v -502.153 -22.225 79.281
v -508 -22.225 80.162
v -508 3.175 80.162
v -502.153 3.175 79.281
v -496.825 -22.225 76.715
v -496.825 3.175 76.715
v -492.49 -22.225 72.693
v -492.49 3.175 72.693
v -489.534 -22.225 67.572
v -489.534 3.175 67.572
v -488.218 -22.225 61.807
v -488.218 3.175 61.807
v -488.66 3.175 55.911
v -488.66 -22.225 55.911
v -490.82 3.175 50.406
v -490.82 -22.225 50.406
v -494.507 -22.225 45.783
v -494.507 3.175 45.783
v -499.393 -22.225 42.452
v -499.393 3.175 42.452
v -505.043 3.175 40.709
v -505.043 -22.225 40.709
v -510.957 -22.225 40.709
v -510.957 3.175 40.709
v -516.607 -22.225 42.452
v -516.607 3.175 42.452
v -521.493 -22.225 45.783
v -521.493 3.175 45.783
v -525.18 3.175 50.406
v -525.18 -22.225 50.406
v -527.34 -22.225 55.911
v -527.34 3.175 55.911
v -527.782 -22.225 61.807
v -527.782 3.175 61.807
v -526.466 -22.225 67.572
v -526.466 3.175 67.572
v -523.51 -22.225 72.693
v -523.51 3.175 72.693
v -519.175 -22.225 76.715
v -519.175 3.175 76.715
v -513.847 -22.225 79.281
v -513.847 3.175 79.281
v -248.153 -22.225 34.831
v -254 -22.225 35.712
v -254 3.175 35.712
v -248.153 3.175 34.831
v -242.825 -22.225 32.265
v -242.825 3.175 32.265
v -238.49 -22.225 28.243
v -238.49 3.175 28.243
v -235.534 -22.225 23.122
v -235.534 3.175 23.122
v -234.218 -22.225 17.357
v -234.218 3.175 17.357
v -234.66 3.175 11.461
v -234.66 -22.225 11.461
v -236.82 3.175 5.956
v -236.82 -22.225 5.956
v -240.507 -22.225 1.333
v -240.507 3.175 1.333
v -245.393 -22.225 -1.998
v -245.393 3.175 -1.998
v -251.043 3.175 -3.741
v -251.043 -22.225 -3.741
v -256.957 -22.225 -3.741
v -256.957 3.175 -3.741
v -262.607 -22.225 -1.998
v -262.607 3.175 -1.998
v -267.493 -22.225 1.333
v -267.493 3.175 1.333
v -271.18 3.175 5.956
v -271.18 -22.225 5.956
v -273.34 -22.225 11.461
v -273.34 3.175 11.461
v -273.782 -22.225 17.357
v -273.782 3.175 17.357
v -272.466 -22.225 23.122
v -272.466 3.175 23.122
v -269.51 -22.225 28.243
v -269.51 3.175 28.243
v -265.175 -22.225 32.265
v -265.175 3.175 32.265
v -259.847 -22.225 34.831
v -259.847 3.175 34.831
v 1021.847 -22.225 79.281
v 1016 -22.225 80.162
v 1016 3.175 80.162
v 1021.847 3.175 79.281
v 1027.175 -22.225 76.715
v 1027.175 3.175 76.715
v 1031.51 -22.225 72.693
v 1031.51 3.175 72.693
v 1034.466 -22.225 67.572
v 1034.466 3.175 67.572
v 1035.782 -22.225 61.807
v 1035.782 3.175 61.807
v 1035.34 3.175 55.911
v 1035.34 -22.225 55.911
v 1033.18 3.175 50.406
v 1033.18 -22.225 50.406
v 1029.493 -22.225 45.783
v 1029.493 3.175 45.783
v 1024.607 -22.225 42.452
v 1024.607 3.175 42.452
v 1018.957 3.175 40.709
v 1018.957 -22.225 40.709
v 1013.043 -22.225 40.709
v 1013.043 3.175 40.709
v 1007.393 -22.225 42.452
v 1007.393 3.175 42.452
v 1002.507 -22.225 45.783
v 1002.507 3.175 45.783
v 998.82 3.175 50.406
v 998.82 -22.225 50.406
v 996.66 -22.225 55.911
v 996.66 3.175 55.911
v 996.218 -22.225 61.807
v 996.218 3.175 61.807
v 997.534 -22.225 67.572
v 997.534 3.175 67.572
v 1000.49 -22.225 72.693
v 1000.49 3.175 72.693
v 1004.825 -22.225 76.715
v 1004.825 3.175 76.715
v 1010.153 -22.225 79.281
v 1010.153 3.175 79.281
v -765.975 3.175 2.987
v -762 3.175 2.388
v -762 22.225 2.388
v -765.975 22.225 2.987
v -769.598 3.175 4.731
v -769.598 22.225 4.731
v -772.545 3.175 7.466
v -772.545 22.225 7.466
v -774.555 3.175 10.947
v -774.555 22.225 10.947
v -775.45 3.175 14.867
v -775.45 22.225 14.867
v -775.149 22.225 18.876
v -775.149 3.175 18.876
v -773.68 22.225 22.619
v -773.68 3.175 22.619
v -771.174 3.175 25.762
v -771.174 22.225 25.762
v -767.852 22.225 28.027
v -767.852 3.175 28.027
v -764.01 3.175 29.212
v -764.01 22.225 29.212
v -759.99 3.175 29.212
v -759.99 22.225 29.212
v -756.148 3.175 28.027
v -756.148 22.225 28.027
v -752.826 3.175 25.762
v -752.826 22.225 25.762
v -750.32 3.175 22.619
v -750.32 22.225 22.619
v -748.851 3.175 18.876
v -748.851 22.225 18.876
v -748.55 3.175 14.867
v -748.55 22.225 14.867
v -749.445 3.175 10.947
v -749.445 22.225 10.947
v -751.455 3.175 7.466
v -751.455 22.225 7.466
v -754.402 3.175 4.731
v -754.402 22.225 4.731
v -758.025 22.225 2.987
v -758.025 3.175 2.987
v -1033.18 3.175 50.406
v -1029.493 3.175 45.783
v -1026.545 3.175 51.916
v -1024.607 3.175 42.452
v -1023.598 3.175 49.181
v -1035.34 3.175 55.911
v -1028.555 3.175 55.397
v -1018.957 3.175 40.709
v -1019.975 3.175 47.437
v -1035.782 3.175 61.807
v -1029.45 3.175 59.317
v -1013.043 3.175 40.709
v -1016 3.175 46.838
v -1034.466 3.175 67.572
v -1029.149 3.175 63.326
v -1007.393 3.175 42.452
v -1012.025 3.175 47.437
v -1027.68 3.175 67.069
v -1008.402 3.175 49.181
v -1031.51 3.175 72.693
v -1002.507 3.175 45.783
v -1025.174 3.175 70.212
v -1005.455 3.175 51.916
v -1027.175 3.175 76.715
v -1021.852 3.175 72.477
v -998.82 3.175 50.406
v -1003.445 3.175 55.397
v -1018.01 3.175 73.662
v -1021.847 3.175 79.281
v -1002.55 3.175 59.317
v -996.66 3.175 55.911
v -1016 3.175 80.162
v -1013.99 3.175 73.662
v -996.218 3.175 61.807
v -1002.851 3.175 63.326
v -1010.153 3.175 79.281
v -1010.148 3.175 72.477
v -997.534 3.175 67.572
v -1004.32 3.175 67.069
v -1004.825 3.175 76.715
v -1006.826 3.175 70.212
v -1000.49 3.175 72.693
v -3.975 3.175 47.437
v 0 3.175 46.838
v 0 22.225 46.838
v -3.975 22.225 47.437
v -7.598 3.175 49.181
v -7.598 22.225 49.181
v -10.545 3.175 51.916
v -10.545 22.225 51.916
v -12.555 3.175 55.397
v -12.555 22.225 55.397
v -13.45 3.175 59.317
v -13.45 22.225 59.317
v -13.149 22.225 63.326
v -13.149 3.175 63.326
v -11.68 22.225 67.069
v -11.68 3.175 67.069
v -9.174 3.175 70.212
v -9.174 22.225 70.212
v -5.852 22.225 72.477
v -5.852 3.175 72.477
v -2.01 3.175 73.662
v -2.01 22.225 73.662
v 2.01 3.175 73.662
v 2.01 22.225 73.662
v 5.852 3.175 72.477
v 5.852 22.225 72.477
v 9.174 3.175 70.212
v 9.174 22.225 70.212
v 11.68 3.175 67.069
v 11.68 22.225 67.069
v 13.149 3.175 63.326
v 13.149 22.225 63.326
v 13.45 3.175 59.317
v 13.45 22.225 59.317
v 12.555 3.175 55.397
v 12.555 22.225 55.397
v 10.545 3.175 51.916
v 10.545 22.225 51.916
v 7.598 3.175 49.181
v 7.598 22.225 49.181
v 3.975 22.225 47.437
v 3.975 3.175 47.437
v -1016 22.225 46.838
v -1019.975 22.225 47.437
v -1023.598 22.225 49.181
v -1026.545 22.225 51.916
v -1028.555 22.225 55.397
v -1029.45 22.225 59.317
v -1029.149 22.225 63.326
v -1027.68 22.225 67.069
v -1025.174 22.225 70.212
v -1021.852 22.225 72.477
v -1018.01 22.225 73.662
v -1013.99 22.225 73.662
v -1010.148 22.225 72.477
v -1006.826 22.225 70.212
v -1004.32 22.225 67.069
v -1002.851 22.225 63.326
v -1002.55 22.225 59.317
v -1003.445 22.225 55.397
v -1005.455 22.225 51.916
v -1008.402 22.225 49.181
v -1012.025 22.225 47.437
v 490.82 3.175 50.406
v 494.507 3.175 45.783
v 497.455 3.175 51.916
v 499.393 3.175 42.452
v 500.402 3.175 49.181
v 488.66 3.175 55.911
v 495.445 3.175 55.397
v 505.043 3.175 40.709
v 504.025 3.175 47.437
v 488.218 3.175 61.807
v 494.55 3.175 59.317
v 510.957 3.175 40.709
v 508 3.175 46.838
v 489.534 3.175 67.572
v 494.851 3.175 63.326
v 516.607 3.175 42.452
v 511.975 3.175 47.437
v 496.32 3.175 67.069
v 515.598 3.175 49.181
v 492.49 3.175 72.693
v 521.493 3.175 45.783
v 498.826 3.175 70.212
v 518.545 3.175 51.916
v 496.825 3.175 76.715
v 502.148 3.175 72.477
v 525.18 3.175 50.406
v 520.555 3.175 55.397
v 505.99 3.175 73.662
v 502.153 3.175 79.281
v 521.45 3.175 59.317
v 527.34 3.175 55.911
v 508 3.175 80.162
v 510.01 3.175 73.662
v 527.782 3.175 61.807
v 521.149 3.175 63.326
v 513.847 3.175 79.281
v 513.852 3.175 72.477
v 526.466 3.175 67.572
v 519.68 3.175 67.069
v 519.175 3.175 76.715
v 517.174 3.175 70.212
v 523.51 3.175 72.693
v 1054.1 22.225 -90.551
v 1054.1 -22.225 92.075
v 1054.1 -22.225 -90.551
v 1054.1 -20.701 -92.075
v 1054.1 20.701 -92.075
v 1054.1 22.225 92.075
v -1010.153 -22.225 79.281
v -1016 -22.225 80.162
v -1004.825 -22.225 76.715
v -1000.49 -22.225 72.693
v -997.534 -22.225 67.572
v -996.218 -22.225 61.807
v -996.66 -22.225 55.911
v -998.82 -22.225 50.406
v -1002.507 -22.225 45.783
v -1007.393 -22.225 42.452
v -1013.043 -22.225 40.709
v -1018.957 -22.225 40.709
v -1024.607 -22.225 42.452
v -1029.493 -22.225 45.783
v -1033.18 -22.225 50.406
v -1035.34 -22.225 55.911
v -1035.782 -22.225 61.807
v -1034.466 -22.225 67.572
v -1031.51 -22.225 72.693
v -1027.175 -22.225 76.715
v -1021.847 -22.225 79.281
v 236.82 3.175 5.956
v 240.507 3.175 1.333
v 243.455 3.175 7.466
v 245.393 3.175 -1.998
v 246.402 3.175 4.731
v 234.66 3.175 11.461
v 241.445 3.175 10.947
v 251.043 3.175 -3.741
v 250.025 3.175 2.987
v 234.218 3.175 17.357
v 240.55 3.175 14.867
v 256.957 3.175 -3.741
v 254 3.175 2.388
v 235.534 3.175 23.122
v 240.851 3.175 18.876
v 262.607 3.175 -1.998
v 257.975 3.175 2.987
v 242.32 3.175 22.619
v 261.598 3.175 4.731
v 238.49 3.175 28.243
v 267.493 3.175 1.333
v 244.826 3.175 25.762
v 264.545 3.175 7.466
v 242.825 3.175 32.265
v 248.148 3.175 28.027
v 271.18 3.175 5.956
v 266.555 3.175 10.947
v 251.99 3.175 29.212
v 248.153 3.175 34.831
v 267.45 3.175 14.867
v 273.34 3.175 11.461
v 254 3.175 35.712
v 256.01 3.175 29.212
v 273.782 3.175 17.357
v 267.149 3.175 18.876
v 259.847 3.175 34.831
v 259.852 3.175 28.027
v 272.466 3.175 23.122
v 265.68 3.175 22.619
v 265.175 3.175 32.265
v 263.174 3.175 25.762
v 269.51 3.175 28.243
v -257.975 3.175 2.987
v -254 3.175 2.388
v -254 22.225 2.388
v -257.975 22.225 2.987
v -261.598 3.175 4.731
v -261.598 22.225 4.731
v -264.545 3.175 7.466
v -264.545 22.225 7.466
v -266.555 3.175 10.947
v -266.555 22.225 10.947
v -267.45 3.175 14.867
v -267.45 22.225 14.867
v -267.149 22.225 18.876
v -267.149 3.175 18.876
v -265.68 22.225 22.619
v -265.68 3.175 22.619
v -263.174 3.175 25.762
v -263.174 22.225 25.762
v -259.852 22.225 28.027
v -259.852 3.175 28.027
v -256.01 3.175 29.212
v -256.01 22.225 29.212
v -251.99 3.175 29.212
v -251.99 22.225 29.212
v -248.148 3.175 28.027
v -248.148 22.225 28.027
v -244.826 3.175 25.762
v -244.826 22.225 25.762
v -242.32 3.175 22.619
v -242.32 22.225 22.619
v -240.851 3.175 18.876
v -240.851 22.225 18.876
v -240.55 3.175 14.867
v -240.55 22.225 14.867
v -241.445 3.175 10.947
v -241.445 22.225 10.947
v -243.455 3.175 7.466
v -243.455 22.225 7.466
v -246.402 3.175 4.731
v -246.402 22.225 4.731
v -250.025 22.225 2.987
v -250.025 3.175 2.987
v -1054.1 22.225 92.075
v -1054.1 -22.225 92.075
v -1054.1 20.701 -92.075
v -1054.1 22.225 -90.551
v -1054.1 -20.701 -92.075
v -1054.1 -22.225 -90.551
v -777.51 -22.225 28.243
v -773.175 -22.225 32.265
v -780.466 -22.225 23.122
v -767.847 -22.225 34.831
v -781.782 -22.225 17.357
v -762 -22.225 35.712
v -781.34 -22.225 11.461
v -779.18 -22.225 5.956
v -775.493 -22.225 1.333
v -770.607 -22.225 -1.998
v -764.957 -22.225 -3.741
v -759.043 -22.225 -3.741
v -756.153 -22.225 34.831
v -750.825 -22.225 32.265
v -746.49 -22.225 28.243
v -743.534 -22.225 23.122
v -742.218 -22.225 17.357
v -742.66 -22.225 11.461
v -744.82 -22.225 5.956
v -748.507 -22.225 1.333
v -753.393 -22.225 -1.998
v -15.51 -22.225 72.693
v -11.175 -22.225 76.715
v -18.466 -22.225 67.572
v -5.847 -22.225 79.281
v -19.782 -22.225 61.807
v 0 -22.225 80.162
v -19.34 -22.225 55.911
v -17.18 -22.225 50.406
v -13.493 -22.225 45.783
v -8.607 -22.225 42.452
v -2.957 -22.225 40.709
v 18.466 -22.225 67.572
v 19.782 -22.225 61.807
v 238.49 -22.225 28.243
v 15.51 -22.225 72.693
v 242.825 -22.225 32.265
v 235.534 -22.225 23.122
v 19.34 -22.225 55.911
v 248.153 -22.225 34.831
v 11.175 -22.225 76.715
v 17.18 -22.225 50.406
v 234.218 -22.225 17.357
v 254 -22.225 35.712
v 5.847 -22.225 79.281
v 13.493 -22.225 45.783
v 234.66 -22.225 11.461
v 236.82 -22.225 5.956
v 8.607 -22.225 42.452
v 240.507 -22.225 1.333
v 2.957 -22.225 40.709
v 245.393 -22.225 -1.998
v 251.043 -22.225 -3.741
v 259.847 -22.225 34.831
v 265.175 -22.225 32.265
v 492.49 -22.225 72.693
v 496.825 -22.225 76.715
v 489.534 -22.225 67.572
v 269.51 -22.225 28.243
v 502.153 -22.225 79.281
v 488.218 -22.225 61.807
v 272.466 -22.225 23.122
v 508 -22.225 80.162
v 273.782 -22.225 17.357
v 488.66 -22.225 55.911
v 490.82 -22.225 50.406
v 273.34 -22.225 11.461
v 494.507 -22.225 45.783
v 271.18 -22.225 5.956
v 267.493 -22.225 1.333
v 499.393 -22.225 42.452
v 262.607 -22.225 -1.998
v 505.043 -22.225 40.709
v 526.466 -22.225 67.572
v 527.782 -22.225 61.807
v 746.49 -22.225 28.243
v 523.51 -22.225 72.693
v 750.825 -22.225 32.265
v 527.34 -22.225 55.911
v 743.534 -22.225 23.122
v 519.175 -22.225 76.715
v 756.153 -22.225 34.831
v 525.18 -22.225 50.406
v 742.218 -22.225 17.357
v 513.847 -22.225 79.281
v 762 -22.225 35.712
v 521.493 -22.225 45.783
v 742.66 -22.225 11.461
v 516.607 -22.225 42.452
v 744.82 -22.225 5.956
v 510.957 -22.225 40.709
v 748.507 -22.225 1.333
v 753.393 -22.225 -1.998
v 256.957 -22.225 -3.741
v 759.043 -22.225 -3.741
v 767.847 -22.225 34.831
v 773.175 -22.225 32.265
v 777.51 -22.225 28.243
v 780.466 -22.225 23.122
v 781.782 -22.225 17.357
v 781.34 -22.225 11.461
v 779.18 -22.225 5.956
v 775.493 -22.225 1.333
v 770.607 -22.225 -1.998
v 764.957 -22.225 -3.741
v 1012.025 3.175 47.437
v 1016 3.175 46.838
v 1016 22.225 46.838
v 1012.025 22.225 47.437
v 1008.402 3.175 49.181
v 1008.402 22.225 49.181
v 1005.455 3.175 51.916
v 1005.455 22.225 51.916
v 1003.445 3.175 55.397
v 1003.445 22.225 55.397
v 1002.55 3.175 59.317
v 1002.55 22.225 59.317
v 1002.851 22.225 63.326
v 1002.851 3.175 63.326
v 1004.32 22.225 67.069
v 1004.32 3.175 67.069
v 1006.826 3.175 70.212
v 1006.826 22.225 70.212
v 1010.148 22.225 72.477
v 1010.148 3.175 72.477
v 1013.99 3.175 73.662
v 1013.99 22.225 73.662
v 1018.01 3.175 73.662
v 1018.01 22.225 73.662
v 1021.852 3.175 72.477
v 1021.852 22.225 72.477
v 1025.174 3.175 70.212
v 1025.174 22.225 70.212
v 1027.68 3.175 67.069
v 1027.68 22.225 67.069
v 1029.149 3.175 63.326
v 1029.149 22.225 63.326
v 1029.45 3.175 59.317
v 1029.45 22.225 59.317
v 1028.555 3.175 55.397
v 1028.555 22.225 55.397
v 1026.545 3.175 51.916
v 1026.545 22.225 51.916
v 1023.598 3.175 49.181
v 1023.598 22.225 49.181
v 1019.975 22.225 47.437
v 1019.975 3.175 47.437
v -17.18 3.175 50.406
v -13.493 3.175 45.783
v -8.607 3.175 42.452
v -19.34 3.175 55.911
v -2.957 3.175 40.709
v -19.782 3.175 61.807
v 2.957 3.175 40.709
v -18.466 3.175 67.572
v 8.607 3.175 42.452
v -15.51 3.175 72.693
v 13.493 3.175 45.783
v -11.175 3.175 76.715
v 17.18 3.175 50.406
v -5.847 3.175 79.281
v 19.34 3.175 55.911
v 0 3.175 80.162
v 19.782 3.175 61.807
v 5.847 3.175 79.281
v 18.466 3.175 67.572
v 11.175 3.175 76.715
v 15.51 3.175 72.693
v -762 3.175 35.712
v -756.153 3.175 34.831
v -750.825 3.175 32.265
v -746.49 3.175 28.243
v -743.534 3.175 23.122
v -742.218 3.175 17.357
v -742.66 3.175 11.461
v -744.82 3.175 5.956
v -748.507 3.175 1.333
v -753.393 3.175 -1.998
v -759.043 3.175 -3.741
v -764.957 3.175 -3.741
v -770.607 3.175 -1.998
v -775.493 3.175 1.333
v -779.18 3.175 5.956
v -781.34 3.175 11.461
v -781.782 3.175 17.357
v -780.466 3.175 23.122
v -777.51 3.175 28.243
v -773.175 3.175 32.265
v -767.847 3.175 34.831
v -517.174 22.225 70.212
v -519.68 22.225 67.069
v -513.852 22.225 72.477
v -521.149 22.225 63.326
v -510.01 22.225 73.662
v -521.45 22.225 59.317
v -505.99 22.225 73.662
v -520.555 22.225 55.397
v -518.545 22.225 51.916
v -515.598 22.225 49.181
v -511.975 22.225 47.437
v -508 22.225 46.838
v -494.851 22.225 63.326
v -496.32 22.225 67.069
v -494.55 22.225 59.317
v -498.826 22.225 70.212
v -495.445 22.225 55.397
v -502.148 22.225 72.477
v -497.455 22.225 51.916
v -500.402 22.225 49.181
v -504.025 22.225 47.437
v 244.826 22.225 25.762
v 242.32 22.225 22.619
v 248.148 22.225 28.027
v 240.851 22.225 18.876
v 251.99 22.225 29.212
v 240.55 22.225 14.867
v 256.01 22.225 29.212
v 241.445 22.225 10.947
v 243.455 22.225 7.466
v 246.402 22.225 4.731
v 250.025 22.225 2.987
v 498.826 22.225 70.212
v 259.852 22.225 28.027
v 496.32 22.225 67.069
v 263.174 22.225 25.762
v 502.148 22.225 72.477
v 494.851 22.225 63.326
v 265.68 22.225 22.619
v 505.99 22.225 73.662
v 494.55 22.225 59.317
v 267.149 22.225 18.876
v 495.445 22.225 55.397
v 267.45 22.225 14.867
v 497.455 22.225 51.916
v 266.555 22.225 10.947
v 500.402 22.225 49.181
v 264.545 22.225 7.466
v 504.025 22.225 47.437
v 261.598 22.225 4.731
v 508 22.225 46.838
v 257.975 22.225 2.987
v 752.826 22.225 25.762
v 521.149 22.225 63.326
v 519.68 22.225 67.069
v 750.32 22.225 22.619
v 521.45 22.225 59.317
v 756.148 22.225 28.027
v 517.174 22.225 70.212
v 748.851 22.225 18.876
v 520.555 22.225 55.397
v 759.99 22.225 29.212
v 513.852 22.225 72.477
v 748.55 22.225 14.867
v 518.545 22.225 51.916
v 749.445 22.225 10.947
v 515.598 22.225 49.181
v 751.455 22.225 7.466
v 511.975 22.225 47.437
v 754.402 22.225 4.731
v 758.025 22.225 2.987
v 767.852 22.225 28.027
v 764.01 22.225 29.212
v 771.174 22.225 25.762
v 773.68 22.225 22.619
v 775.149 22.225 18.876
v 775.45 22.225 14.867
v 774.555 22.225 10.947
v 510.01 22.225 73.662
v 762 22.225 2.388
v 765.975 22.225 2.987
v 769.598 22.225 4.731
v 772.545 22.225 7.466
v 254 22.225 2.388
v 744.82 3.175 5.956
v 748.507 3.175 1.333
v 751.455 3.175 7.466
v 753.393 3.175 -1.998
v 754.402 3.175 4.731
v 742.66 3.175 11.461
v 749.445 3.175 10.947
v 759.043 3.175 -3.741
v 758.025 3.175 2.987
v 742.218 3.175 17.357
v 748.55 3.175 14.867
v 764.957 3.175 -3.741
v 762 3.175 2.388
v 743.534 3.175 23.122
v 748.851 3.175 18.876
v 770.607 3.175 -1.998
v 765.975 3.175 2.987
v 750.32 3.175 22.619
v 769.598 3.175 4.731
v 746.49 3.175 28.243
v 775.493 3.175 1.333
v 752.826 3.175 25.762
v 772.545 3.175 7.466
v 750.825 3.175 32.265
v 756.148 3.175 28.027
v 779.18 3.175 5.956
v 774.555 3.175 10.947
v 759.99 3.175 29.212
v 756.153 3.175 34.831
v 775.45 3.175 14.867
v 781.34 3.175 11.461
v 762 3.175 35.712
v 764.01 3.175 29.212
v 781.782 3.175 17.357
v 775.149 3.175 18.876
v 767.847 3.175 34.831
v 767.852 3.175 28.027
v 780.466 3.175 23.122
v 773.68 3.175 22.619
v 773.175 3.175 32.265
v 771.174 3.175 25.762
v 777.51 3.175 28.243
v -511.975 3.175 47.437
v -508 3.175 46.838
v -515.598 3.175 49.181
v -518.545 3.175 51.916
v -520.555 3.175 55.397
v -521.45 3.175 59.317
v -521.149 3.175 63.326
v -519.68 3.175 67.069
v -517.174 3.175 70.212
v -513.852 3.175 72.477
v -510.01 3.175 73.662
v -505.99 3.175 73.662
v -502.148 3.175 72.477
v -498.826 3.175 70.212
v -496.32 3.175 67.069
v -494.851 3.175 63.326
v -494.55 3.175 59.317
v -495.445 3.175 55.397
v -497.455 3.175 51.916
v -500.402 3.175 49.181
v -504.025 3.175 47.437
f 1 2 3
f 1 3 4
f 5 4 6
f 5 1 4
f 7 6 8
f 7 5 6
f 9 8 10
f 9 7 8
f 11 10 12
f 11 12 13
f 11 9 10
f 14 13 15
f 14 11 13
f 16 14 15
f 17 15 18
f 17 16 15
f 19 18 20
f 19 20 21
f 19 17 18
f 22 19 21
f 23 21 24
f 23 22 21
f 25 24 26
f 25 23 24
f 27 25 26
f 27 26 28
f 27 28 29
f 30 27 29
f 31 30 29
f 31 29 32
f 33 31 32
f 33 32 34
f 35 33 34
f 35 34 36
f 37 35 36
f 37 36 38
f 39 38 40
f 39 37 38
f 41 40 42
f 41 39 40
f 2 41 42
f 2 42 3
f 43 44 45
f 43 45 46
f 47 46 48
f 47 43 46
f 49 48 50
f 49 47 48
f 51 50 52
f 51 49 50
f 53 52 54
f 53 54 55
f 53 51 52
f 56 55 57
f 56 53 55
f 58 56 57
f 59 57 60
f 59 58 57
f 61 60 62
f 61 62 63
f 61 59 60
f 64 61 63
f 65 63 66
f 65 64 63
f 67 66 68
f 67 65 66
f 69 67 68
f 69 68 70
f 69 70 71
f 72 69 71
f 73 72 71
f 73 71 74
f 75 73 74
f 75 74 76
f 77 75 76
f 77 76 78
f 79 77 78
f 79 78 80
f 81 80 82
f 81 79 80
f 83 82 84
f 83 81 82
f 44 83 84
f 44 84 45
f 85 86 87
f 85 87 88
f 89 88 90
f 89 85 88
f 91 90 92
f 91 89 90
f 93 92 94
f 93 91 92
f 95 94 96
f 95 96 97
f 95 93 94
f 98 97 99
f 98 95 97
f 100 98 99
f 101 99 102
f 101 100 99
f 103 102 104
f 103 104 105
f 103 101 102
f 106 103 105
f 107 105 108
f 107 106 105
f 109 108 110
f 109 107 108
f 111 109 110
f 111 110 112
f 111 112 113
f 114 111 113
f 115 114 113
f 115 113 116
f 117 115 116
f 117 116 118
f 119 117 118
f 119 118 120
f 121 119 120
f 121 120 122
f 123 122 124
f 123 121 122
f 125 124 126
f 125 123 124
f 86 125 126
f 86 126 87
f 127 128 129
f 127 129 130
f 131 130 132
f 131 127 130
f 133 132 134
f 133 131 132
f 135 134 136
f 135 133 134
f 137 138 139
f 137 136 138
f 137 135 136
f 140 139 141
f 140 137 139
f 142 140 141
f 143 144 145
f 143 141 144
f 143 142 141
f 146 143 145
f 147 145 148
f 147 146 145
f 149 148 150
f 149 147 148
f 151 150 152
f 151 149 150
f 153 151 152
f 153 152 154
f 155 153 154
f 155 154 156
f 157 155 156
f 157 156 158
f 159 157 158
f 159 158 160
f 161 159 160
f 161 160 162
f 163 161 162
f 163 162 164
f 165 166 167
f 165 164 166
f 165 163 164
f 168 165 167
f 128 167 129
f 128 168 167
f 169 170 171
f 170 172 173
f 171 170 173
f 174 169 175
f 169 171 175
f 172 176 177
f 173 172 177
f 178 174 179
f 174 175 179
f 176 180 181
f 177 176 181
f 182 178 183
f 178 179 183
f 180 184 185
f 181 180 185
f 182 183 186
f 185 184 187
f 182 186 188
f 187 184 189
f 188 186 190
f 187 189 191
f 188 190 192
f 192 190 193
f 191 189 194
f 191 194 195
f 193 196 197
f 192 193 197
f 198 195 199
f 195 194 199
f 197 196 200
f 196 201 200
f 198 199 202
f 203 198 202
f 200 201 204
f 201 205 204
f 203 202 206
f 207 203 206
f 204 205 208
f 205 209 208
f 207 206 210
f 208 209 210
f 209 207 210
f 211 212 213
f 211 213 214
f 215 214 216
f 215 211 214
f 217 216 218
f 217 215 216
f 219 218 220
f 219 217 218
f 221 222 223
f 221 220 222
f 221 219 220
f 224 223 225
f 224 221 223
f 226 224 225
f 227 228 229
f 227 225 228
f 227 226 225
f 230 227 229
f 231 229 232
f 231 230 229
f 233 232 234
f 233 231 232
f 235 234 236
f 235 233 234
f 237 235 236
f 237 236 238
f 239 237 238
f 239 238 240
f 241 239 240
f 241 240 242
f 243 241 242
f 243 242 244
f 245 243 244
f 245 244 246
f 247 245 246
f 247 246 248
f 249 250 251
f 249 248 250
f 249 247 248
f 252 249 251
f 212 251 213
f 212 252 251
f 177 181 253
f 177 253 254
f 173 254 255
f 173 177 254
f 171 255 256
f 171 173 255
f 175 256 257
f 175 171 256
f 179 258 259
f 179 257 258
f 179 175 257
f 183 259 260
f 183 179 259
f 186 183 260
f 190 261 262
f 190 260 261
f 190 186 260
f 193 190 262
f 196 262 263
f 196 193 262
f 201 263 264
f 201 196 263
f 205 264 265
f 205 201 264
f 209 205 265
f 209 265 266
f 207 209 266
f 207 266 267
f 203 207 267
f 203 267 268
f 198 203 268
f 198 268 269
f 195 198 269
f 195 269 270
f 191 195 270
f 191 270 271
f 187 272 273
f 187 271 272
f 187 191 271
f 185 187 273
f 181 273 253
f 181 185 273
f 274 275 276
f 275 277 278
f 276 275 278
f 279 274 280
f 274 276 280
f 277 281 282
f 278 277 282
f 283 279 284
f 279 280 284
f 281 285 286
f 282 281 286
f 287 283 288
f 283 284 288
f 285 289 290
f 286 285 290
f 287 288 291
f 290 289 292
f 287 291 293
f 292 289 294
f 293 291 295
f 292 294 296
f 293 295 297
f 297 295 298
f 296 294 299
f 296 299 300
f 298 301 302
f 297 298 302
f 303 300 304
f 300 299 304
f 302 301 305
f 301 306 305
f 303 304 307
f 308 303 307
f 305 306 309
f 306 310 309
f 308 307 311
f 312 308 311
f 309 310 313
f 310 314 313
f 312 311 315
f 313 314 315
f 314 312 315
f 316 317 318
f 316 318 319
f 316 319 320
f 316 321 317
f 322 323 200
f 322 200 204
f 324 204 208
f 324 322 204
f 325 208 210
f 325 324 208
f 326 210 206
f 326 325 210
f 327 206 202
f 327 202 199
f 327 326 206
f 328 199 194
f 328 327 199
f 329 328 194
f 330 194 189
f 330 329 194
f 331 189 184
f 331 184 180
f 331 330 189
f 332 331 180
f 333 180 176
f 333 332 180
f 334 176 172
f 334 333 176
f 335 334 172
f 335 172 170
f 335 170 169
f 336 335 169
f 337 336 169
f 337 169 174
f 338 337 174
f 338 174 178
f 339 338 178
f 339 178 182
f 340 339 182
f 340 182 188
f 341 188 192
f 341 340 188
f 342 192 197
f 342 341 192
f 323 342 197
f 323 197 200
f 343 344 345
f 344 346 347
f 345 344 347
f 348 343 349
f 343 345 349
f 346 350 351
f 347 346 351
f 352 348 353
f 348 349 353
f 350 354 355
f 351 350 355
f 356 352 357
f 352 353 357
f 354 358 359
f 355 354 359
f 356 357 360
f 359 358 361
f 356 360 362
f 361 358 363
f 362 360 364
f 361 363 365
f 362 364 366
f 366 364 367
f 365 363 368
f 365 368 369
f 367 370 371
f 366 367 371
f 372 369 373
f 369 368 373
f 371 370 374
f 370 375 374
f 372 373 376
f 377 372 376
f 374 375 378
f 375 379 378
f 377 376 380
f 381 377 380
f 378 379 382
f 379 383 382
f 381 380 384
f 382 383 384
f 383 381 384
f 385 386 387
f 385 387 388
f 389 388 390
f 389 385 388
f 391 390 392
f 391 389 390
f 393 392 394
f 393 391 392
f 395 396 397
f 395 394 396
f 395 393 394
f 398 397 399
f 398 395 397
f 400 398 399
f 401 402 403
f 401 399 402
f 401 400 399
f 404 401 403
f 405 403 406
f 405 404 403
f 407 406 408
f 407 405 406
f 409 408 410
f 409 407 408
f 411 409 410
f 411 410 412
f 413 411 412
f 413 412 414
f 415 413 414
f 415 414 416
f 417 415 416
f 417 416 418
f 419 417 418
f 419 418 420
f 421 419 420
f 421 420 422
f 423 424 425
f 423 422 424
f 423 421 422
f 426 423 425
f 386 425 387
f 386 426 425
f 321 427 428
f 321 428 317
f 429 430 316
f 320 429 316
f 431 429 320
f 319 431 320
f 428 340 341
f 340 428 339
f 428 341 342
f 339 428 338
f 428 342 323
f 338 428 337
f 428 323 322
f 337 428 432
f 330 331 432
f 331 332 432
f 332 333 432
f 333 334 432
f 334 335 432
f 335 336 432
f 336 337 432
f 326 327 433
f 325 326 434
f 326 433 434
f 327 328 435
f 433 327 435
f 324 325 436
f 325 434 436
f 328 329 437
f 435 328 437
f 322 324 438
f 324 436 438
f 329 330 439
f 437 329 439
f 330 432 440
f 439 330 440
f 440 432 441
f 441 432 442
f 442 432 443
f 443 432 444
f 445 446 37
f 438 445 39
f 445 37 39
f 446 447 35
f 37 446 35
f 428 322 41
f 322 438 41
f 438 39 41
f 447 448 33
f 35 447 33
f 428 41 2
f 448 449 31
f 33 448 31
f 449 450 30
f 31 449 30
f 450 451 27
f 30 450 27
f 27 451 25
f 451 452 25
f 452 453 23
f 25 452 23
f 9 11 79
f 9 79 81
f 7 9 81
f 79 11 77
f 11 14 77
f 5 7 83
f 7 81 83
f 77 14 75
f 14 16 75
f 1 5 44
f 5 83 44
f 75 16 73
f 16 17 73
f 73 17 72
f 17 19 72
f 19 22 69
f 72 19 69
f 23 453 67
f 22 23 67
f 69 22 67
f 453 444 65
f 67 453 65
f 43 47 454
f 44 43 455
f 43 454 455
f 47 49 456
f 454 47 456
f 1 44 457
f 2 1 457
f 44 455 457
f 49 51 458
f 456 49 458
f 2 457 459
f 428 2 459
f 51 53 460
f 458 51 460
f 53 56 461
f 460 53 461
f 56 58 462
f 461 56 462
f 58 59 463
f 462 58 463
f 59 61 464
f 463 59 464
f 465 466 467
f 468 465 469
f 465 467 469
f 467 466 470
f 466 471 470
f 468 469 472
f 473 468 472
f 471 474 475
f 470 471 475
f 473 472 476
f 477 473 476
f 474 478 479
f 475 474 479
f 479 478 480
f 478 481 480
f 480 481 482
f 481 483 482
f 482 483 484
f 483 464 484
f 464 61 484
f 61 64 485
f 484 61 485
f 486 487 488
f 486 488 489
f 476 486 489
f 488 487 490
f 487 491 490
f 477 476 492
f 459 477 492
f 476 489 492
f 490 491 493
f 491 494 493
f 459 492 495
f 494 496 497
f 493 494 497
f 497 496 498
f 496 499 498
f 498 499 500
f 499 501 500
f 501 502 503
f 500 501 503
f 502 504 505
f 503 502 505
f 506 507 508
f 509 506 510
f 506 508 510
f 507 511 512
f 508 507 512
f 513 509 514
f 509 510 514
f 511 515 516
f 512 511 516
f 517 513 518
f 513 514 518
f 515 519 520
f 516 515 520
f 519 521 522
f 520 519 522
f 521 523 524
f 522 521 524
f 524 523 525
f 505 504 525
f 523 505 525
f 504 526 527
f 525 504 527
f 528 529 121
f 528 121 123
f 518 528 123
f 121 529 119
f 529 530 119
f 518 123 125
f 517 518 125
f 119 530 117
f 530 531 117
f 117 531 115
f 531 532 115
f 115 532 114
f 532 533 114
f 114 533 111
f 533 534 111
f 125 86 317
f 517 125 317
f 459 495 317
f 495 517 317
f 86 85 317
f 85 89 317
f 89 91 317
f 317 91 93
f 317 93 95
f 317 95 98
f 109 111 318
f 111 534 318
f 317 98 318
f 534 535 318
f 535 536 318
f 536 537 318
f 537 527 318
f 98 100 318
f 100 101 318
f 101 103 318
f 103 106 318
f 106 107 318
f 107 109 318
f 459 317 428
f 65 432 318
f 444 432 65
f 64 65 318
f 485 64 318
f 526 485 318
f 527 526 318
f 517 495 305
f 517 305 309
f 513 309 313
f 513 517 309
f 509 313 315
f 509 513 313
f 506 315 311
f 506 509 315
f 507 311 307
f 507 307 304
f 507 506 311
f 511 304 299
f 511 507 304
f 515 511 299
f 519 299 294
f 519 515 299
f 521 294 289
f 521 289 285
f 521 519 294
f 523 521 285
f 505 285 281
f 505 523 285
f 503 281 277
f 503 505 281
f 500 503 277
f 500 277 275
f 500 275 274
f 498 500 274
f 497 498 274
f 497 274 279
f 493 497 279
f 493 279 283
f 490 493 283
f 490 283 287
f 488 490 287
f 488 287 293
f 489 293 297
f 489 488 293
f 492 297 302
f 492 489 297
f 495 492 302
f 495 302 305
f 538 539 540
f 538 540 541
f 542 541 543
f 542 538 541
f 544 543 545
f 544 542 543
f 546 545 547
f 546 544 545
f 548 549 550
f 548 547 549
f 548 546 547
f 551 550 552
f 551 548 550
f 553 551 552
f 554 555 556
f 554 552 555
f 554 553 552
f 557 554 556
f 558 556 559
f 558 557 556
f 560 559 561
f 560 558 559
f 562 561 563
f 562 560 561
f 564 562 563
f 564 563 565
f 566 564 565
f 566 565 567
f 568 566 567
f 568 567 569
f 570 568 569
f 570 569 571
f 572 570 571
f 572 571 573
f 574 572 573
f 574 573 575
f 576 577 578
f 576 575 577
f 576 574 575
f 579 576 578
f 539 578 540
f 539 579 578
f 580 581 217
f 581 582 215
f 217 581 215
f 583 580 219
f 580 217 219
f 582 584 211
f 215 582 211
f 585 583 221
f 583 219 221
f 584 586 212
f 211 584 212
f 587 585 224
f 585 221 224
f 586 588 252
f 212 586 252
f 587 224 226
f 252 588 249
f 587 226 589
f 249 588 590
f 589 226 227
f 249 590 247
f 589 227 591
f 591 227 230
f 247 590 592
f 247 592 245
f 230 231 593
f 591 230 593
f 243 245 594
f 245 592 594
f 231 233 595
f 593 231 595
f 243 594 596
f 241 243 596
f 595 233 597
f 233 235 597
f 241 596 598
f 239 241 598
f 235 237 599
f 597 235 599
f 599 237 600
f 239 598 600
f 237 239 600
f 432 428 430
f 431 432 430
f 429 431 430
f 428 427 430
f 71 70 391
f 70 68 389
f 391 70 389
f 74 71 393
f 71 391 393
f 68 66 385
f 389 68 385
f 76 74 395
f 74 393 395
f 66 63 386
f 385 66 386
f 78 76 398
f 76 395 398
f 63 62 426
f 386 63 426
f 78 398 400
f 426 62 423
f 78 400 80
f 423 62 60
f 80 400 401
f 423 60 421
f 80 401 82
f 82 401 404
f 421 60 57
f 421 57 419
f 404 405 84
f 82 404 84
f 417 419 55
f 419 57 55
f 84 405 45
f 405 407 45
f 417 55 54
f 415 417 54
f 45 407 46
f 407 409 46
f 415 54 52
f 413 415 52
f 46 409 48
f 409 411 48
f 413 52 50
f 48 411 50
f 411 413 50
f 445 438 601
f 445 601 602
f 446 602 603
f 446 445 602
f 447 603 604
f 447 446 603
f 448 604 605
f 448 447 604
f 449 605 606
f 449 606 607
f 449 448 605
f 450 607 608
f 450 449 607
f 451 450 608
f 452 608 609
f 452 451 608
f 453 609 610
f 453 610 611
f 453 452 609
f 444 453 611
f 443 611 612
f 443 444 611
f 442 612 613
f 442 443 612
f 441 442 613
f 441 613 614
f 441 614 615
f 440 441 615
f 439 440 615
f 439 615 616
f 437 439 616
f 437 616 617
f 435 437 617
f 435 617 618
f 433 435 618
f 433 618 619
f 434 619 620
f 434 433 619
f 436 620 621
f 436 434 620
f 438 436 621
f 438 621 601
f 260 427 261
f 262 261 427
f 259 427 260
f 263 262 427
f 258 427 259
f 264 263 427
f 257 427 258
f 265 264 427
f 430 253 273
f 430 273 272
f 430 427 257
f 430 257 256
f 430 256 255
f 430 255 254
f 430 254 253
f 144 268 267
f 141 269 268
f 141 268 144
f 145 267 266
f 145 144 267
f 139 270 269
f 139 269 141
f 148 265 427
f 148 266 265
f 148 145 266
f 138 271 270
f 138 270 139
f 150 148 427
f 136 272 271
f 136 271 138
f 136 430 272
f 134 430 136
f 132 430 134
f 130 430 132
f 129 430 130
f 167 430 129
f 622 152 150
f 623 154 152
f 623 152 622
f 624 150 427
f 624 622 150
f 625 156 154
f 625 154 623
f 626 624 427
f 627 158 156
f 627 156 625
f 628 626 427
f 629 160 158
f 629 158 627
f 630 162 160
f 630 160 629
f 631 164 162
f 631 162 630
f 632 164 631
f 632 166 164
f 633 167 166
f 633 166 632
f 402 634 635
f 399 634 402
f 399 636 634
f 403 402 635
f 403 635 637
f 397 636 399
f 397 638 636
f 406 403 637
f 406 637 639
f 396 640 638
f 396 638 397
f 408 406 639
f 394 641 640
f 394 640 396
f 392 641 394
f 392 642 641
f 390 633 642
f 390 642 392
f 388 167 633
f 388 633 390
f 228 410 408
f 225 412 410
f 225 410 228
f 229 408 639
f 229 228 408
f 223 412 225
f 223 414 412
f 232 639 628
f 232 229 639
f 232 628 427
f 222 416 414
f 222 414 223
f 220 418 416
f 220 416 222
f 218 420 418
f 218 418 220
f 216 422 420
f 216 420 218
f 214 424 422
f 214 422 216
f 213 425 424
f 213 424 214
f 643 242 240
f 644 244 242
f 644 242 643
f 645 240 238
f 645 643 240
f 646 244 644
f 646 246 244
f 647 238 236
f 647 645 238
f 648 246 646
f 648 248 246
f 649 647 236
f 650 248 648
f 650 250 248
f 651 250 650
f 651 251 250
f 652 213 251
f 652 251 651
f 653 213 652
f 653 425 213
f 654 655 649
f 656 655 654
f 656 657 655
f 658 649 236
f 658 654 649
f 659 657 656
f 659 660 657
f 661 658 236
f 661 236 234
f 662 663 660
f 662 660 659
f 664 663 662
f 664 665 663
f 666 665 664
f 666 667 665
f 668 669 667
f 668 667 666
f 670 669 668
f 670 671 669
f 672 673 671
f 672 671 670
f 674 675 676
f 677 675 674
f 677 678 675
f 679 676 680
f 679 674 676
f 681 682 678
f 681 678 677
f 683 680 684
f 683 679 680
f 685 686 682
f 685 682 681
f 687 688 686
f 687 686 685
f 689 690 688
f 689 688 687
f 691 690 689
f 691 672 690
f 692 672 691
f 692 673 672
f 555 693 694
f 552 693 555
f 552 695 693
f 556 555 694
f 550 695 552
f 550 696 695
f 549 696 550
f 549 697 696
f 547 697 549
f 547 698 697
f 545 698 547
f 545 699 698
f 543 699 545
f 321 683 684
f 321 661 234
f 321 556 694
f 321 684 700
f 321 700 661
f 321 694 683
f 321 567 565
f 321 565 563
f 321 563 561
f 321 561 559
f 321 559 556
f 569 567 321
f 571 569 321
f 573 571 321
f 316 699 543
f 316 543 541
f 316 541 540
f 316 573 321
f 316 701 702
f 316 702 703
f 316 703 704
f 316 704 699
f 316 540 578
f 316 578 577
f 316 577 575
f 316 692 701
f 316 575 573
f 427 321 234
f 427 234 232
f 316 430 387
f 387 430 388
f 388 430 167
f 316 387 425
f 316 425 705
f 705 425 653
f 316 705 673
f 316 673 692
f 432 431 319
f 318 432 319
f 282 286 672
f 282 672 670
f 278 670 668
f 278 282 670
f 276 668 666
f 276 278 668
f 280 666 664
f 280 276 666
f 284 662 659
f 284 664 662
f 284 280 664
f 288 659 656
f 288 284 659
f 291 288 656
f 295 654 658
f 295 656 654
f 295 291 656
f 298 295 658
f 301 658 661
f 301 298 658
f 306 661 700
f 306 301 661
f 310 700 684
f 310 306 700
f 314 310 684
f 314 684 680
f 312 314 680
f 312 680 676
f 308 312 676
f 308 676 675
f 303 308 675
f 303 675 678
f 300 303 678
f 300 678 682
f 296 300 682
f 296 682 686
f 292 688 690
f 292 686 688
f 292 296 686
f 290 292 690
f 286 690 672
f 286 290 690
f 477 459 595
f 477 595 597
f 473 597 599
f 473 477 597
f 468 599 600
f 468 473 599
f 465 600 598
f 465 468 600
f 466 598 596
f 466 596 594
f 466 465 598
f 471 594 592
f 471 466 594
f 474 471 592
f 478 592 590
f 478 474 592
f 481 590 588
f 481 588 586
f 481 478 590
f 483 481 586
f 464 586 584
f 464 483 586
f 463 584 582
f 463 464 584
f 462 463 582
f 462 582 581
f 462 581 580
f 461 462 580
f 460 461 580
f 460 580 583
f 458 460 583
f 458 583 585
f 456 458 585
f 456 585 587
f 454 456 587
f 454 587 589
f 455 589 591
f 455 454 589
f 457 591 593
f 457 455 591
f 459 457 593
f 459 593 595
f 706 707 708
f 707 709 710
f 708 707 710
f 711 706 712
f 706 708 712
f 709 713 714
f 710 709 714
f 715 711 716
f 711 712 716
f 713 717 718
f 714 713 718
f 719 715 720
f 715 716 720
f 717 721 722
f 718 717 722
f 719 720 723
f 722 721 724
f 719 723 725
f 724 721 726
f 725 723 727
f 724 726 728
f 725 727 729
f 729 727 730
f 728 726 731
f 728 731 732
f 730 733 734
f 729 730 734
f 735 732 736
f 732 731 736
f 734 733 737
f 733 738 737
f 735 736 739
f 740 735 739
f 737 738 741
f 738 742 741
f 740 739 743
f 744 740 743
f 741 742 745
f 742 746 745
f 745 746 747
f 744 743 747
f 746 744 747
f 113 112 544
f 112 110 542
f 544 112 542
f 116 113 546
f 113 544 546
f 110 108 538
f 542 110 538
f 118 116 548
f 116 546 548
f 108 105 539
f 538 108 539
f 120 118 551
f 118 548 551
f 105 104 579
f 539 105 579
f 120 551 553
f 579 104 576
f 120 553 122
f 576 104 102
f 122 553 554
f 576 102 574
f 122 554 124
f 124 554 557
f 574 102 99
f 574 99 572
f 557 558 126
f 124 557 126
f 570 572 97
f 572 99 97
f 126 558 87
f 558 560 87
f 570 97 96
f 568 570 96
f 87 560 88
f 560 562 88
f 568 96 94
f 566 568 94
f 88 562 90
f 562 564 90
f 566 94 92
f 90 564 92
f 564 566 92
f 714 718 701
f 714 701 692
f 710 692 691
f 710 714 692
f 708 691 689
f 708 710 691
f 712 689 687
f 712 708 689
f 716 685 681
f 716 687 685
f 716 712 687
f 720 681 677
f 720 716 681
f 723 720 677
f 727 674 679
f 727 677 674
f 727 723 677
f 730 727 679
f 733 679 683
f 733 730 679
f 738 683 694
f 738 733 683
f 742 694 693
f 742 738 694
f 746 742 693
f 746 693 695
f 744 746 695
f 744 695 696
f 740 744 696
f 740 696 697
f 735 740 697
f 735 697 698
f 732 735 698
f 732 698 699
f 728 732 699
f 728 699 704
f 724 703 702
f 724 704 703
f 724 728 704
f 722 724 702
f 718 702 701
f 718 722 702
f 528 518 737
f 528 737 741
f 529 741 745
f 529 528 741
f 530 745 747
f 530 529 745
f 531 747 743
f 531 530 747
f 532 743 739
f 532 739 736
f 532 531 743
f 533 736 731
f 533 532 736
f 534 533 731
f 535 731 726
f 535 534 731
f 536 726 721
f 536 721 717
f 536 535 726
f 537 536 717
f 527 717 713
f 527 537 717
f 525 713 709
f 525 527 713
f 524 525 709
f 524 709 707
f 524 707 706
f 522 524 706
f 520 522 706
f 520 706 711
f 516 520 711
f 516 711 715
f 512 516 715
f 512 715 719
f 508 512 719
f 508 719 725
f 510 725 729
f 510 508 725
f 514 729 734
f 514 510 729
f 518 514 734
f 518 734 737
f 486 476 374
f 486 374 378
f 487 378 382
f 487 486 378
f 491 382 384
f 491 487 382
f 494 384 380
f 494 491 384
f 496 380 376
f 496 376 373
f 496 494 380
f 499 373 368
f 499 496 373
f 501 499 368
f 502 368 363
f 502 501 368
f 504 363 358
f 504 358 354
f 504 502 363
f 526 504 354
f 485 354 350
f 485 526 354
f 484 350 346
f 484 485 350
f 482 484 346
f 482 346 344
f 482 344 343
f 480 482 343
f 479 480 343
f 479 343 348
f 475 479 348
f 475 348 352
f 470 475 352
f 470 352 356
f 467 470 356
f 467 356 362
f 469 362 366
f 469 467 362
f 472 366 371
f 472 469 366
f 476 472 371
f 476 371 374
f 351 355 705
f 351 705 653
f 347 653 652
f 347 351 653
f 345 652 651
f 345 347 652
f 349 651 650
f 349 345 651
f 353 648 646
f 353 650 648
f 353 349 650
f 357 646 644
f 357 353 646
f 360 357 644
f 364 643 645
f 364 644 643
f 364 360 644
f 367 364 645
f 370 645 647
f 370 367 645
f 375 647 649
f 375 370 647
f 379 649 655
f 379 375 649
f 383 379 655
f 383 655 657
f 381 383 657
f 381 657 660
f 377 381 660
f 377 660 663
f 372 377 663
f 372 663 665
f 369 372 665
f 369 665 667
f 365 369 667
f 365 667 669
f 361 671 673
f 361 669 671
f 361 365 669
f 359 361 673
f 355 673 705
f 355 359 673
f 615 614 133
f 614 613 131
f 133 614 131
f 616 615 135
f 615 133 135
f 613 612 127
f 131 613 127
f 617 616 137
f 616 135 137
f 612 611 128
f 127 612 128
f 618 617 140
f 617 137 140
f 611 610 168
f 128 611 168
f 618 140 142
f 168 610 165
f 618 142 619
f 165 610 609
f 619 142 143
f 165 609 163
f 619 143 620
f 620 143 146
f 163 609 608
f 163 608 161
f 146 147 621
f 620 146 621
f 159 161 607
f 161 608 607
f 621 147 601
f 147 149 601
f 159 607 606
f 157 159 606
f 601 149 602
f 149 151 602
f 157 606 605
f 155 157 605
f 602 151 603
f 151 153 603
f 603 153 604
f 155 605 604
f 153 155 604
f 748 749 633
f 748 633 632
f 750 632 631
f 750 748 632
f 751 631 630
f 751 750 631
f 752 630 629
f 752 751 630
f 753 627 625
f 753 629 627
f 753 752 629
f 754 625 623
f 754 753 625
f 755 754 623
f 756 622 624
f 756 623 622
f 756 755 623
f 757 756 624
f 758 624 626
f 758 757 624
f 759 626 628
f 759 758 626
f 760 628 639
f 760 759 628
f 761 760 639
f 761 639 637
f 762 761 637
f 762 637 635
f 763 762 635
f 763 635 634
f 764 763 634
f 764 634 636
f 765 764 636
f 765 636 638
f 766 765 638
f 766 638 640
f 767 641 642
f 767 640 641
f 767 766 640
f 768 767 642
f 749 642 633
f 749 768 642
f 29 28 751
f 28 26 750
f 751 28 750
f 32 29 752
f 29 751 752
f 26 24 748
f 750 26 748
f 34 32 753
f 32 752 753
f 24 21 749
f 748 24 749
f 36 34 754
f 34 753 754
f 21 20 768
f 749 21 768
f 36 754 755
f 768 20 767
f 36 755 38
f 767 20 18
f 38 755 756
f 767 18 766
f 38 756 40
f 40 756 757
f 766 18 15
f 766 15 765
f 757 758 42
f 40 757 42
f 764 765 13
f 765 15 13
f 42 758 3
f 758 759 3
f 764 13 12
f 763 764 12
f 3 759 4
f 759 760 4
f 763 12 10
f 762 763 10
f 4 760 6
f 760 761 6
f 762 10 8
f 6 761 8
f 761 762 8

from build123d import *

# Parameters (mm, degrees)
SKETCH1_W           = 2108.2
SKETCH1_H           = 184.15
BOSS_EXTRUDE1_DEPTH = 22.225
CUT_EXTRUDE2_START  = -22.225
SKETCH2_R           = 13.4874
CUT_EXTRUDE2_DEPTH  = 88.9
CUT_EXTRUDE4_START  = -22.225
SKETCH3_R           = 19.8374
CUT_EXTRUDE4_DEPTH  = 25.4
CUT_EXTRUDE6_START  = -22.225
SKETCH4_R           = 13.4874
CUT_EXTRUDE6_DEPTH  = 88.9
CUT_EXTRUDE8_START  = -22.225
SKETCH5_R           = 19.8374
CUT_EXTRUDE8_DEPTH  = 25.4
CHAMFER1_SIZE       = 1.524


with BuildPart() as part:
    # Sketch1 → Boss-Extrude1 (new, symmetric)
    with BuildSketch(Plane(origin=(0, 0, 0), x_dir=(1, 0, 0), z_dir=(0, 1, 0))):
        Rectangle(SKETCH1_W, SKETCH1_H)
    extrude(amount=BOSS_EXTRUDE1_DEPTH, both=True)

    # Sketch2 → Cut-Extrude2 (cut)
    with BuildSketch(Plane(origin=(0, 0, 0), x_dir=(1, 0, 0), z_dir=(0, 1, 0)).offset(CUT_EXTRUDE2_START)):
        with Locations(Location((-1016, -60.325, 0), (0, 0, 90))):
            Circle(SKETCH2_R)
        with Locations(Location((-508, -60.325, 0), (0, 0, 90))):
            Circle(SKETCH2_R)
        with Locations(Location((0, -60.325, 0), (0, 0, 90))):
            Circle(SKETCH2_R)
        with Locations(Location((508, -60.325, 0), (0, 0, 90))):
            Circle(SKETCH2_R)
        with Locations(Location((1016, -60.325, 0), (0, 0, 90))):
            Circle(SKETCH2_R)
    extrude(amount=CUT_EXTRUDE2_DEPTH, mode=Mode.SUBTRACT)

    # Sketch3 → Cut-Extrude4 (cut)
    with BuildSketch(Plane(origin=(0, 0, 0), x_dir=(1, 0, 0), z_dir=(0, 1, 0)).offset(CUT_EXTRUDE4_START)):
        with Locations(Location((-1016, -60.325, 0), (0, 0, 270))):
            Circle(SKETCH3_R)
        with Locations(Location((-508, -60.325, 0), (0, 0, 270))):
            Circle(SKETCH3_R)
        with Locations(Location((0, -60.325, 0), (0, 0, 270))):
            Circle(SKETCH3_R)
        with Locations(Location((508, -60.325, 0), (0, 0, 270))):
            Circle(SKETCH3_R)
        with Locations(Location((1016, -60.325, 0), (0, 0, 270))):
            Circle(SKETCH3_R)
    extrude(amount=CUT_EXTRUDE4_DEPTH, mode=Mode.SUBTRACT)

    # Sketch4 → Cut-Extrude6 (cut)
    with BuildSketch(Plane(origin=(0, 0, 0), x_dir=(1, 0, 0), z_dir=(0, 1, 0)).offset(CUT_EXTRUDE6_START)):
        with Locations(Location((-762, -15.875, 0), (0, 0, 90))):
            Circle(SKETCH4_R)
        with Locations(Location((-254, -15.875, 0), (0, 0, 90))):
            Circle(SKETCH4_R)
        with Locations(Location((254, -15.875, 0), (0, 0, 90))):
            Circle(SKETCH4_R)
        with Locations(Location((762, -15.875, 0), (0, 0, 90))):
            Circle(SKETCH4_R)
    extrude(amount=CUT_EXTRUDE6_DEPTH, mode=Mode.SUBTRACT)

    # Sketch5 → Cut-Extrude8 (cut)
    with BuildSketch(Plane(origin=(0, 0, 0), x_dir=(1, 0, 0), z_dir=(0, 1, 0)).offset(CUT_EXTRUDE8_START)):
        with Locations(Location((-762, -15.875, 0), (0, 0, 270))):
            Circle(SKETCH5_R)
        with Locations(Location((-254, -15.875, 0), (0, 0, 270))):
            Circle(SKETCH5_R)
        with Locations(Location((254, -15.875, 0), (0, 0, 270))):
            Circle(SKETCH5_R)
        with Locations(Location((762, -15.875, 0), (0, 0, 270))):
            Circle(SKETCH5_R)
    extrude(amount=CUT_EXTRUDE8_DEPTH, mode=Mode.SUBTRACT)

    # Chamfer1
    chamfer1_edges = [part.edges().sort_by_distance(p)[0] for p in [
        (0, -22.225, -92.075),
        (0, 22.225, -92.075),
    ]]
    chamfer(chamfer1_edges, length=CHAMFER1_SIZE)


solid = part.part
